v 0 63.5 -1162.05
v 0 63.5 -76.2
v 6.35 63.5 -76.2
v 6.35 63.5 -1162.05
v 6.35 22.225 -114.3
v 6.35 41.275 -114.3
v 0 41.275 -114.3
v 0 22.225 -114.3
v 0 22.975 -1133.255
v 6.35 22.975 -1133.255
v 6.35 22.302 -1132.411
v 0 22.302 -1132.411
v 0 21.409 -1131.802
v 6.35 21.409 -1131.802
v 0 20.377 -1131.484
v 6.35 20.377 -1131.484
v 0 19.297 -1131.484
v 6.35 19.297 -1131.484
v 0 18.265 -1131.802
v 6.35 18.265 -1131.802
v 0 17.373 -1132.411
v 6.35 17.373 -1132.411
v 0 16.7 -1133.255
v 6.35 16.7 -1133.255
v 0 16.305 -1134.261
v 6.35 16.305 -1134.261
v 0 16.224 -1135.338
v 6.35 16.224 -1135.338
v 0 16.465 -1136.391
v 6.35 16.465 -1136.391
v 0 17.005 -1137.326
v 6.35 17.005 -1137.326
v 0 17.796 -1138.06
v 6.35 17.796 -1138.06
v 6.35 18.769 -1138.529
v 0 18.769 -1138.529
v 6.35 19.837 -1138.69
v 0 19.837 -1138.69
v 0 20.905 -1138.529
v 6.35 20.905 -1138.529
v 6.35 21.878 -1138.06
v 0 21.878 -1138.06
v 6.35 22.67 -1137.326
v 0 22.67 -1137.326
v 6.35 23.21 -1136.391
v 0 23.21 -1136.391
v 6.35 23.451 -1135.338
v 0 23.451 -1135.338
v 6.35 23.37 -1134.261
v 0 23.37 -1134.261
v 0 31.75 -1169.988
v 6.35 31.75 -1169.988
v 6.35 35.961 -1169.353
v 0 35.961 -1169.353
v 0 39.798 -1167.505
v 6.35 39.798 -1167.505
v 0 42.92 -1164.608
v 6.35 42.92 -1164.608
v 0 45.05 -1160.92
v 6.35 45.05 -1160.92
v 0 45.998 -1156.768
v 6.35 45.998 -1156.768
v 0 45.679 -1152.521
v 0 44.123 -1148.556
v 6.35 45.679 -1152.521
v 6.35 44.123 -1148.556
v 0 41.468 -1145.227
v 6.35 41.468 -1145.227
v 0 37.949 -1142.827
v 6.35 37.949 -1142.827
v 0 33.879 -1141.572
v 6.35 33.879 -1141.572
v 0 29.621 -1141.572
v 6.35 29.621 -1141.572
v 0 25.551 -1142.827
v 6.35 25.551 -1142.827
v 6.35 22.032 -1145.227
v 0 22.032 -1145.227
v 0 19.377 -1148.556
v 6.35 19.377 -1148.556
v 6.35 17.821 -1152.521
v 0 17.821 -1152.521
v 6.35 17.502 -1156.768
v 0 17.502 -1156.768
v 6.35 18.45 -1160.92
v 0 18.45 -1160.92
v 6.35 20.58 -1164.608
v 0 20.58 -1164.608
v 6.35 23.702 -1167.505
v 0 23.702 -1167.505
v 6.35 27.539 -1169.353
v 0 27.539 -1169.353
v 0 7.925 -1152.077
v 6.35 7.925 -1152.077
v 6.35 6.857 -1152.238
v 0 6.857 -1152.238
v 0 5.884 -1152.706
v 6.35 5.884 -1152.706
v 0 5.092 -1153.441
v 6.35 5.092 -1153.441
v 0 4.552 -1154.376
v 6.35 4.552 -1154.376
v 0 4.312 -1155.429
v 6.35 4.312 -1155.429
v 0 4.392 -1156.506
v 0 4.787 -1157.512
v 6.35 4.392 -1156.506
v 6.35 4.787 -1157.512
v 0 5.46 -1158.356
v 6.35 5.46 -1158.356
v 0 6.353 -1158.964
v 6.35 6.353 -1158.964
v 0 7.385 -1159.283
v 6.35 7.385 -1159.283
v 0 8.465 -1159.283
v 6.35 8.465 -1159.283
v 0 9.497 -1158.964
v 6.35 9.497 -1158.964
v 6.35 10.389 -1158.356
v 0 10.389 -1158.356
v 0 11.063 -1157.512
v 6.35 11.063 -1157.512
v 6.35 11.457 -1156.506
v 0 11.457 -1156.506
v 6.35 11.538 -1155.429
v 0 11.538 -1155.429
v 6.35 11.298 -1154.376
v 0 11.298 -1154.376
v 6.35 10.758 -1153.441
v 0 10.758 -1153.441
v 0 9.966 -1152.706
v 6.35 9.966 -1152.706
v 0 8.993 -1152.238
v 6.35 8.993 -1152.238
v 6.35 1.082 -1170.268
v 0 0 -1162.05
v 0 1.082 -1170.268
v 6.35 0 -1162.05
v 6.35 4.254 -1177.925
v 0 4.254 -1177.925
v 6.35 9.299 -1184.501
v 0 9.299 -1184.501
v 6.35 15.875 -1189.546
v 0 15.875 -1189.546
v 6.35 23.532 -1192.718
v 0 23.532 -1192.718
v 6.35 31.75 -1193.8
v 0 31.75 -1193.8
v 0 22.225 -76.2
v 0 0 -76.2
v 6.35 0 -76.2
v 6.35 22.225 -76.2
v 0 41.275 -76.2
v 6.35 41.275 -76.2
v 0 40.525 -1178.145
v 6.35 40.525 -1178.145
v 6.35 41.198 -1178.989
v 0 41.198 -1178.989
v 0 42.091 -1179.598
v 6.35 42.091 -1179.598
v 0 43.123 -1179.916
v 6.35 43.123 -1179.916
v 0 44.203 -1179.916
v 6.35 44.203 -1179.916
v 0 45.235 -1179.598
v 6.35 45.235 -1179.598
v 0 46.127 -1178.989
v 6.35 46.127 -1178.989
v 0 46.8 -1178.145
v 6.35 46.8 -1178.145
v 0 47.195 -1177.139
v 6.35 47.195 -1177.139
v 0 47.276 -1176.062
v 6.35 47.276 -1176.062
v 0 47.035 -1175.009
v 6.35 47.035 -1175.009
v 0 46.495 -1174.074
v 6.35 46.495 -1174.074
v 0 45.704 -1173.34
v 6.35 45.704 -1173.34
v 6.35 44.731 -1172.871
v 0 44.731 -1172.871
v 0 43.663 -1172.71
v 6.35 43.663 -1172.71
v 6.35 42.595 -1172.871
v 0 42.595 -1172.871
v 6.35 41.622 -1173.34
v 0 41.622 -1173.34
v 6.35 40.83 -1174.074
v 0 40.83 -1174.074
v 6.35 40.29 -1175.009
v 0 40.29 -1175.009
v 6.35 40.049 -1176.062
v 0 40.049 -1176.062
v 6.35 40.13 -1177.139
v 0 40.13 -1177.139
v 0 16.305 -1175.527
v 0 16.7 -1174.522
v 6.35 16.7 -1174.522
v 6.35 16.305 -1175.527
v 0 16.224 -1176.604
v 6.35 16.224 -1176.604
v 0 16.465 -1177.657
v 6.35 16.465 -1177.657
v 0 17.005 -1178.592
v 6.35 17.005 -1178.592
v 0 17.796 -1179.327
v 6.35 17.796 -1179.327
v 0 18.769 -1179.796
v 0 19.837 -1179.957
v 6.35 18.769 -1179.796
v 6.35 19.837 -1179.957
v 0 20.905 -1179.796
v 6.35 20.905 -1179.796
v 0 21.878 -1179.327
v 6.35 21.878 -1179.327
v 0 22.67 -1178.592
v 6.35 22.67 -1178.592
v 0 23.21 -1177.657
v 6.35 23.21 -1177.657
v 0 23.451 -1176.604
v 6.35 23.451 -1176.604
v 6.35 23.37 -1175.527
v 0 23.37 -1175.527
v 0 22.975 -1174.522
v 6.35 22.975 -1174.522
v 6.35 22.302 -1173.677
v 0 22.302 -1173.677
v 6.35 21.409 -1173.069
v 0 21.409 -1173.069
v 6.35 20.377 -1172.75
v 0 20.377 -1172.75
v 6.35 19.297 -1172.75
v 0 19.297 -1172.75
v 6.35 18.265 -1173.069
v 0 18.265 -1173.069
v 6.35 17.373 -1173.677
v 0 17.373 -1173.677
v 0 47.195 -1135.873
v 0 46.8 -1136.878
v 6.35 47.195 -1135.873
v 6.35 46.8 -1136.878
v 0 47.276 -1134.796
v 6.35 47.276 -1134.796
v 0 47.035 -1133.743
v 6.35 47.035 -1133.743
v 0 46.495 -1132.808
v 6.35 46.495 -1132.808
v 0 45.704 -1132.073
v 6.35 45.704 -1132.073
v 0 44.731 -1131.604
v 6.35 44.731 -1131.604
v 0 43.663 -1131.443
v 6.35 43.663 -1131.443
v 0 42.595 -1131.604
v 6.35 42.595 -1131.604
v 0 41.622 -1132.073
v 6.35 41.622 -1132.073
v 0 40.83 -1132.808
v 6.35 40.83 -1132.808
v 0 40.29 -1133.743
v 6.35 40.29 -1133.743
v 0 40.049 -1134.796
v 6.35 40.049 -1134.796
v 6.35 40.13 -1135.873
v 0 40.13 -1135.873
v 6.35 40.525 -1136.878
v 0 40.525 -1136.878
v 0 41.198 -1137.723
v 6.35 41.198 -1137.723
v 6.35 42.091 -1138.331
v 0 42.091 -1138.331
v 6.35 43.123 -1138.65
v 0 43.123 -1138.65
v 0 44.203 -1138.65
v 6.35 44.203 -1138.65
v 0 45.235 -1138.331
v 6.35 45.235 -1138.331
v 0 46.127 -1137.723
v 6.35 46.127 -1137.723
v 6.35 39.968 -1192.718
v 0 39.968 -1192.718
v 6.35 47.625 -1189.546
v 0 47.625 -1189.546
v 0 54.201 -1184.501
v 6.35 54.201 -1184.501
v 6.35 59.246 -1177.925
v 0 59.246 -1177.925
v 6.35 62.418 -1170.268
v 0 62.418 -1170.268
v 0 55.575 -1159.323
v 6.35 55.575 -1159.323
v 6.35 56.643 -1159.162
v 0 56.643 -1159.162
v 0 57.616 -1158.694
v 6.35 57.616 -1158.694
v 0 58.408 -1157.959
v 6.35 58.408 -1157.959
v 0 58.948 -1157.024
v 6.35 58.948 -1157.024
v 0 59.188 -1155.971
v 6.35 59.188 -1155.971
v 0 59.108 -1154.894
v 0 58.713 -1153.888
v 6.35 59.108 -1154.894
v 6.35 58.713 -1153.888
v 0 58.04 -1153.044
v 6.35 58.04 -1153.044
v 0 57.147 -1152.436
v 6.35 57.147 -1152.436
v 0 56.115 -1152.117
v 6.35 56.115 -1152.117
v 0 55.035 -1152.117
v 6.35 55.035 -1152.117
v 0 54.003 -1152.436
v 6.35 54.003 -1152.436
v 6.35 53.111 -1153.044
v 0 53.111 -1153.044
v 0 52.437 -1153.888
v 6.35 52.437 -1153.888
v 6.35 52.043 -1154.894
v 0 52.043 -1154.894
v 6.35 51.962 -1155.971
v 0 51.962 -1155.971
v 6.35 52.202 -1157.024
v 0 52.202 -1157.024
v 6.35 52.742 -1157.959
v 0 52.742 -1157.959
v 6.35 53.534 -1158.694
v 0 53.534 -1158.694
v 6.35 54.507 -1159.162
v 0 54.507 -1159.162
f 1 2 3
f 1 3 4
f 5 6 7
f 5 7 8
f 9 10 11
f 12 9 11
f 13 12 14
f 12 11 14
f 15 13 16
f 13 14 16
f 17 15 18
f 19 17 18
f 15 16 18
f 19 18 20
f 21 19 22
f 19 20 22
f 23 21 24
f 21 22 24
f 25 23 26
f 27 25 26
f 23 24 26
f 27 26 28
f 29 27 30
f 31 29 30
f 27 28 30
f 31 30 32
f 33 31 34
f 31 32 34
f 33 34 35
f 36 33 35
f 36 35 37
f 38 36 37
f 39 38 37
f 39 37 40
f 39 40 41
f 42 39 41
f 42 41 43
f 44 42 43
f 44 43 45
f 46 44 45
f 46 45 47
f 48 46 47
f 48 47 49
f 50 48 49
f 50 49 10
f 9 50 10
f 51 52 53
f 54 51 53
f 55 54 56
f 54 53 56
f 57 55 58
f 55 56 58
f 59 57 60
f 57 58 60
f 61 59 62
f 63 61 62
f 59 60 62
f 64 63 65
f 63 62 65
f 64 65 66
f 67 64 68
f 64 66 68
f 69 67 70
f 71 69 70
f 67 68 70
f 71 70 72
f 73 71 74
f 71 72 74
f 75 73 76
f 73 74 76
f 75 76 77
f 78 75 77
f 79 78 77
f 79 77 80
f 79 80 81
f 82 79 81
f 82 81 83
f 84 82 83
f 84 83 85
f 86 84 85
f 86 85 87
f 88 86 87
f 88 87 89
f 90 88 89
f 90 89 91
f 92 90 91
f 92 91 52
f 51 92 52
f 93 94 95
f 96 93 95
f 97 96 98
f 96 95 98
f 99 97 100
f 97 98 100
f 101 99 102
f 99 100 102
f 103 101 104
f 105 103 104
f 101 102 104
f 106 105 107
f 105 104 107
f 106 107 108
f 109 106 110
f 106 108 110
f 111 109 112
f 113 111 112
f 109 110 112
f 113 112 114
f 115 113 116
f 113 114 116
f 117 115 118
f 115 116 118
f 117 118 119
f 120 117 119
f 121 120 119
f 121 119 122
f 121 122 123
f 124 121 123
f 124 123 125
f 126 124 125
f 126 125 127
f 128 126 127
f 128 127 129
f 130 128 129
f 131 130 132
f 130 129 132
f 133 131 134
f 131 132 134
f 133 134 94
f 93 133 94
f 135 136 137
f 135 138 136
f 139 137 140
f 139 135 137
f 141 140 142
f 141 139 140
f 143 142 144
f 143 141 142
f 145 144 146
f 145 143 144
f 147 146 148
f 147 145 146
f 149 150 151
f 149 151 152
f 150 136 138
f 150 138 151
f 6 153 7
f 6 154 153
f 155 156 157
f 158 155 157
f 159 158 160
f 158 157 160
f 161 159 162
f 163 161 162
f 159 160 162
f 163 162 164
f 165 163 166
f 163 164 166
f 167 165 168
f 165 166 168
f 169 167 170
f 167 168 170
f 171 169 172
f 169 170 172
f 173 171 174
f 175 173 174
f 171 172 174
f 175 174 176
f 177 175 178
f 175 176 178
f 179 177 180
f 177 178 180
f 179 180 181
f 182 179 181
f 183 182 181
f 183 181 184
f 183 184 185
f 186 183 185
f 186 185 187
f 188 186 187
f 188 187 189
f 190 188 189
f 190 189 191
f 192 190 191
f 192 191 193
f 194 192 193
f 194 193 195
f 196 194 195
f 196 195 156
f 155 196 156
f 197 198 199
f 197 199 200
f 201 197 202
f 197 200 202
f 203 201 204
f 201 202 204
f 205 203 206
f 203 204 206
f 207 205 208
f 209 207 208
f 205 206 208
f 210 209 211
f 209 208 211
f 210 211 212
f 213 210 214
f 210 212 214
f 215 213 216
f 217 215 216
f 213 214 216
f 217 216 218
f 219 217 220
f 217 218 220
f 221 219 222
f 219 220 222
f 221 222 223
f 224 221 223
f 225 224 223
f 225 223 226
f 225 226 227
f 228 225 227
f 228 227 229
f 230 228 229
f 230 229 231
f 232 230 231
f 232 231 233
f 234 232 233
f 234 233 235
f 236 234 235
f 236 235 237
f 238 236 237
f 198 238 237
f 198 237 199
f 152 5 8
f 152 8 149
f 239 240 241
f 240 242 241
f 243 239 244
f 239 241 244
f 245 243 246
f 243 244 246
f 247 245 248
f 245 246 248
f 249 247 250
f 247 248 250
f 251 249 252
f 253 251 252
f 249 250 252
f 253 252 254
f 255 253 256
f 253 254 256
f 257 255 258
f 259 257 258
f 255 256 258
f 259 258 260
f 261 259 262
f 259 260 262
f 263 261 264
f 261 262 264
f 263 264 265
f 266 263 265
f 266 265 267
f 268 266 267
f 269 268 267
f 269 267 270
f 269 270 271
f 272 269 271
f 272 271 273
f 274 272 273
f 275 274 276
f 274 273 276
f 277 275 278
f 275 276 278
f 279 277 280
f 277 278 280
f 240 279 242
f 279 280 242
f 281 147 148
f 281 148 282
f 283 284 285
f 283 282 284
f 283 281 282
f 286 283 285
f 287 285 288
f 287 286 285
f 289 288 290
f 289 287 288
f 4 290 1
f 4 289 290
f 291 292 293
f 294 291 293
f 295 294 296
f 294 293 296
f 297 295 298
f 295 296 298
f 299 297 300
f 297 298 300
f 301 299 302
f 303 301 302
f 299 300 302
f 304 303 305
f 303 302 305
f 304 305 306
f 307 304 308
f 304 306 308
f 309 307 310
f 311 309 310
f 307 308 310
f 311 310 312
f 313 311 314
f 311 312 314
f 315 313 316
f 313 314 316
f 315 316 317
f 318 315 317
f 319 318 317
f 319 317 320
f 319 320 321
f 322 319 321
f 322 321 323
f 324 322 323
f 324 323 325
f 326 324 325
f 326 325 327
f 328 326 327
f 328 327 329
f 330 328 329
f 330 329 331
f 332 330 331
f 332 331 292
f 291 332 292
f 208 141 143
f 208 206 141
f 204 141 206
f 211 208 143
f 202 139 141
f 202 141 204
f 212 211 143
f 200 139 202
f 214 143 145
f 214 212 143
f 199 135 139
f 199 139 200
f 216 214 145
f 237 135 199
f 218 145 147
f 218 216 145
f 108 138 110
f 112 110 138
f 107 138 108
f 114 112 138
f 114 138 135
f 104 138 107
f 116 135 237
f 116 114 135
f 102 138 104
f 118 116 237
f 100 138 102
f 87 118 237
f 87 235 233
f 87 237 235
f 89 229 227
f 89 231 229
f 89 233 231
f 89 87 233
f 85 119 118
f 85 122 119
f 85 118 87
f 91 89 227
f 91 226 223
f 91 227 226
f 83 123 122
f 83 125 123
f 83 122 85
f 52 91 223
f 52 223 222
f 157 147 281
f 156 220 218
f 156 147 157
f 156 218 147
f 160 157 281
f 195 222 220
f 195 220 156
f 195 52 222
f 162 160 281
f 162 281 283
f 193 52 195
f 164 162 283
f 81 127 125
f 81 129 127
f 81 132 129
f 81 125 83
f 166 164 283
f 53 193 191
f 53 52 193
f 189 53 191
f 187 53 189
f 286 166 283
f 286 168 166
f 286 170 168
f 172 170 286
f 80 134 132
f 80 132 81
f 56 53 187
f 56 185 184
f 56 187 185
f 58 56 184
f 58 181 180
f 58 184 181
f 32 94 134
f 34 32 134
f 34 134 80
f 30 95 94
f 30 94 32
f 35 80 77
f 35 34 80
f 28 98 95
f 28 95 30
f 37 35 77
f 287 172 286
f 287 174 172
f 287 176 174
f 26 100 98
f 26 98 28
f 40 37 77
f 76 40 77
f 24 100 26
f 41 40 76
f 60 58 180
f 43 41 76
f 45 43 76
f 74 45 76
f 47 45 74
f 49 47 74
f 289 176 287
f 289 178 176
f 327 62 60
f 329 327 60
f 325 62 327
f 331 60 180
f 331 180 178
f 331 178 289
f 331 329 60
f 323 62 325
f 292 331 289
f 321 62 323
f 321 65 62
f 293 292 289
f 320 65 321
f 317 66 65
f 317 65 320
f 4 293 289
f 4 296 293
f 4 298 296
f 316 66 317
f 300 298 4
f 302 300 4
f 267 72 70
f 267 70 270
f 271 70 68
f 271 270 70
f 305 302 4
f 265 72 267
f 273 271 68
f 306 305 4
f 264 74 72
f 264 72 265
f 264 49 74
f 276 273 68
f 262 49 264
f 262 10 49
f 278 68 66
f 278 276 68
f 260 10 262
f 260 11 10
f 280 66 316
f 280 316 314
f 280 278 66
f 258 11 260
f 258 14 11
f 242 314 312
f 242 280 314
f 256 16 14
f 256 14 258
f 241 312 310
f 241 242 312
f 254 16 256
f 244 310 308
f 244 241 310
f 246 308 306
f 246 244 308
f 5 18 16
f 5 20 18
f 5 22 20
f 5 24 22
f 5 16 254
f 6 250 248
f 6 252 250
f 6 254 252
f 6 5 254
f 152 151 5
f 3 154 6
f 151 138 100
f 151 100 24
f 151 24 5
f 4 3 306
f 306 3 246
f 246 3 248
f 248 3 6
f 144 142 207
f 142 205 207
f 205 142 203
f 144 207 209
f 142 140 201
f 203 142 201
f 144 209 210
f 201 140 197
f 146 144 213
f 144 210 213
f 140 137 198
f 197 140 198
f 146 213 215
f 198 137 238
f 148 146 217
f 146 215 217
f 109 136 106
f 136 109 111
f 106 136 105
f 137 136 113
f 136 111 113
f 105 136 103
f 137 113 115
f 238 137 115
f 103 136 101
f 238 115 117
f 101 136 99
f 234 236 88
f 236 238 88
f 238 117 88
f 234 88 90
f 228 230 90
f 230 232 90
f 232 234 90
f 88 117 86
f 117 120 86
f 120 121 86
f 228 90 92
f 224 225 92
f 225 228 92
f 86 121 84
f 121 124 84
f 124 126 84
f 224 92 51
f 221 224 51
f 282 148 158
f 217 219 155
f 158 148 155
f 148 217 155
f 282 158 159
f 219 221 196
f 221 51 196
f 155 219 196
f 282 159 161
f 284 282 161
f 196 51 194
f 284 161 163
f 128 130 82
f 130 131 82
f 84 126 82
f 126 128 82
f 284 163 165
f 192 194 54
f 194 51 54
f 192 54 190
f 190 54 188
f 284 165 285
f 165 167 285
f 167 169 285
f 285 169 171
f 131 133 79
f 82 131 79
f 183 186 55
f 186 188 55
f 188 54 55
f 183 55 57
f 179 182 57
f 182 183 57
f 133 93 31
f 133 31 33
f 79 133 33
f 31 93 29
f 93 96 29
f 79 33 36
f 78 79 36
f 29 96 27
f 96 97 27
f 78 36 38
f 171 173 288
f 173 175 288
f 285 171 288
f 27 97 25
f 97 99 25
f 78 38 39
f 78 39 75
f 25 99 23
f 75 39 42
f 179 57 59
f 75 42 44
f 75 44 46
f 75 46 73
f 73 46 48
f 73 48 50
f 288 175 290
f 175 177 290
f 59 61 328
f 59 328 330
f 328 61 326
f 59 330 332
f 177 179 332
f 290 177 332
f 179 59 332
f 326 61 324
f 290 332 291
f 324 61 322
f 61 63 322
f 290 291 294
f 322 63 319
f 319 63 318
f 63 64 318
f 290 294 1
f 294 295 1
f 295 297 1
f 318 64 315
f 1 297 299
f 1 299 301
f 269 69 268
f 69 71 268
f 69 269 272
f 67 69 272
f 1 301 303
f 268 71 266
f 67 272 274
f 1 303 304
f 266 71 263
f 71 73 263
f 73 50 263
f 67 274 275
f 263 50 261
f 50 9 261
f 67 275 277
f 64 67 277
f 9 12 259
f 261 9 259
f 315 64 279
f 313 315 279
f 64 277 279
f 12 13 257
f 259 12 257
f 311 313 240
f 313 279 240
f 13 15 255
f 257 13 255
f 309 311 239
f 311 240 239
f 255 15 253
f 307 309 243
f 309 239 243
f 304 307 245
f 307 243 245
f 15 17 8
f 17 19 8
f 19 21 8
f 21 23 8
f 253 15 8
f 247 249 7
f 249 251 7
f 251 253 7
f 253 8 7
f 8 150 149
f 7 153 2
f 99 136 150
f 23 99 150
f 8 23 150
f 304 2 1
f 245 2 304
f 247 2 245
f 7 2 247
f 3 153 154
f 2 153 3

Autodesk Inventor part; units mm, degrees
ref_plane "YZ Plane" through (0, 0, 0) normal (1, 0, 0) x (0, 1, 0)
ref_plane "XZ Plane" through (0, 0, 0) normal (0, 1, 0) x (-1, 0, 0)
ref_plane "XY Plane" through (0, 0, 0) normal (0, 0, 1) x (1, 0, 0)
sketch "Sketch1" plane through (0, 0, 0) normal (1, 0, 0) x (0, 1, 0)
  line L0 (0, -76.2) -> (63.5, -76.2)
  line L1 (63.5, -76.2) -> (63.5, -1193.8)
  line L2 (63.5, -1193.8) -> (0, -1193.8)
  line L3 (0, -1193.8) -> (0, -76.2)
  dimension "d0" = 63.5
  dimension "d1" = 1117.6
extrude "Extrusion1" add sketch "Sketch1" along normal blind 6.35
sketch "Sketch2" plane through (6.35, 0, 0) normal (1, 0, 0) x (0, 0, -1)
  line L0 (1193.8, 63.5) -> (76.2, 63.5) projected
  line L1 (1155.7, 63.5) -> (1155.7, 0) construction
  line L2 (0, 0) -> (1193.8, 0) projected
  circle A0 centre (1155.7, 31.75) radius 14.2875
  dimension "d5" = 1155.7
  dimension "d24" = 28.575
extrude "Extrusion2" cut sketch "Sketch2" against normal through all
fillet "Fillet1" radius 31.75 2 edges at (3.175, 63.5, -1193.8) (3.175, 0, -1193.8)
sketch "Sketch5" plane through (6.35, 0, 0) normal (1, 0, 0) x (0, 0, -1)
  circle A0 centre (1155.7, 31.75) radius 14.2875 projected
  line L0 (1155.7, 31.75) -> (1155.7, 55.5752) construction
  circle A1 centre (1155.7, 55.5752) radius 3.6233
  point P0 (0, 0)
  dimension "d32" = 23.8252
extrude "Extrusion5" cut sketch "Sketch5" against normal through all contours A1
pattern_circular "Circular Pattern1" count 6 over 360 about axis through (6.35, 31.75, -1155.7) along (-1, 0, 0) of "Extrusion5"
sketch "Sketch8" plane through (6.35, 0, 0) normal (1, 0, 0) x (0, 0, -1)
  line L0 (76.2, 41.275) -> (114.3, 41.275)
  line L1 (114.3, 41.275) -> (114.3, 22.225)
  line L2 (114.3, 22.225) -> (76.2, 22.225)
  line L3 (76.2, 22.225) -> (76.2, 41.275)
  line L4 (76.2, 63.5) -> (76.2, 0) projected
  point P0 (0, 0)
  point P1 (76.2, 31.75)
  dimension "d44" = 38.1
  dimension "d45" = 19.05
extrude "Extrusion8" cut sketch "Sketch8" against normal blind 25.4
properties part number "Arm"
